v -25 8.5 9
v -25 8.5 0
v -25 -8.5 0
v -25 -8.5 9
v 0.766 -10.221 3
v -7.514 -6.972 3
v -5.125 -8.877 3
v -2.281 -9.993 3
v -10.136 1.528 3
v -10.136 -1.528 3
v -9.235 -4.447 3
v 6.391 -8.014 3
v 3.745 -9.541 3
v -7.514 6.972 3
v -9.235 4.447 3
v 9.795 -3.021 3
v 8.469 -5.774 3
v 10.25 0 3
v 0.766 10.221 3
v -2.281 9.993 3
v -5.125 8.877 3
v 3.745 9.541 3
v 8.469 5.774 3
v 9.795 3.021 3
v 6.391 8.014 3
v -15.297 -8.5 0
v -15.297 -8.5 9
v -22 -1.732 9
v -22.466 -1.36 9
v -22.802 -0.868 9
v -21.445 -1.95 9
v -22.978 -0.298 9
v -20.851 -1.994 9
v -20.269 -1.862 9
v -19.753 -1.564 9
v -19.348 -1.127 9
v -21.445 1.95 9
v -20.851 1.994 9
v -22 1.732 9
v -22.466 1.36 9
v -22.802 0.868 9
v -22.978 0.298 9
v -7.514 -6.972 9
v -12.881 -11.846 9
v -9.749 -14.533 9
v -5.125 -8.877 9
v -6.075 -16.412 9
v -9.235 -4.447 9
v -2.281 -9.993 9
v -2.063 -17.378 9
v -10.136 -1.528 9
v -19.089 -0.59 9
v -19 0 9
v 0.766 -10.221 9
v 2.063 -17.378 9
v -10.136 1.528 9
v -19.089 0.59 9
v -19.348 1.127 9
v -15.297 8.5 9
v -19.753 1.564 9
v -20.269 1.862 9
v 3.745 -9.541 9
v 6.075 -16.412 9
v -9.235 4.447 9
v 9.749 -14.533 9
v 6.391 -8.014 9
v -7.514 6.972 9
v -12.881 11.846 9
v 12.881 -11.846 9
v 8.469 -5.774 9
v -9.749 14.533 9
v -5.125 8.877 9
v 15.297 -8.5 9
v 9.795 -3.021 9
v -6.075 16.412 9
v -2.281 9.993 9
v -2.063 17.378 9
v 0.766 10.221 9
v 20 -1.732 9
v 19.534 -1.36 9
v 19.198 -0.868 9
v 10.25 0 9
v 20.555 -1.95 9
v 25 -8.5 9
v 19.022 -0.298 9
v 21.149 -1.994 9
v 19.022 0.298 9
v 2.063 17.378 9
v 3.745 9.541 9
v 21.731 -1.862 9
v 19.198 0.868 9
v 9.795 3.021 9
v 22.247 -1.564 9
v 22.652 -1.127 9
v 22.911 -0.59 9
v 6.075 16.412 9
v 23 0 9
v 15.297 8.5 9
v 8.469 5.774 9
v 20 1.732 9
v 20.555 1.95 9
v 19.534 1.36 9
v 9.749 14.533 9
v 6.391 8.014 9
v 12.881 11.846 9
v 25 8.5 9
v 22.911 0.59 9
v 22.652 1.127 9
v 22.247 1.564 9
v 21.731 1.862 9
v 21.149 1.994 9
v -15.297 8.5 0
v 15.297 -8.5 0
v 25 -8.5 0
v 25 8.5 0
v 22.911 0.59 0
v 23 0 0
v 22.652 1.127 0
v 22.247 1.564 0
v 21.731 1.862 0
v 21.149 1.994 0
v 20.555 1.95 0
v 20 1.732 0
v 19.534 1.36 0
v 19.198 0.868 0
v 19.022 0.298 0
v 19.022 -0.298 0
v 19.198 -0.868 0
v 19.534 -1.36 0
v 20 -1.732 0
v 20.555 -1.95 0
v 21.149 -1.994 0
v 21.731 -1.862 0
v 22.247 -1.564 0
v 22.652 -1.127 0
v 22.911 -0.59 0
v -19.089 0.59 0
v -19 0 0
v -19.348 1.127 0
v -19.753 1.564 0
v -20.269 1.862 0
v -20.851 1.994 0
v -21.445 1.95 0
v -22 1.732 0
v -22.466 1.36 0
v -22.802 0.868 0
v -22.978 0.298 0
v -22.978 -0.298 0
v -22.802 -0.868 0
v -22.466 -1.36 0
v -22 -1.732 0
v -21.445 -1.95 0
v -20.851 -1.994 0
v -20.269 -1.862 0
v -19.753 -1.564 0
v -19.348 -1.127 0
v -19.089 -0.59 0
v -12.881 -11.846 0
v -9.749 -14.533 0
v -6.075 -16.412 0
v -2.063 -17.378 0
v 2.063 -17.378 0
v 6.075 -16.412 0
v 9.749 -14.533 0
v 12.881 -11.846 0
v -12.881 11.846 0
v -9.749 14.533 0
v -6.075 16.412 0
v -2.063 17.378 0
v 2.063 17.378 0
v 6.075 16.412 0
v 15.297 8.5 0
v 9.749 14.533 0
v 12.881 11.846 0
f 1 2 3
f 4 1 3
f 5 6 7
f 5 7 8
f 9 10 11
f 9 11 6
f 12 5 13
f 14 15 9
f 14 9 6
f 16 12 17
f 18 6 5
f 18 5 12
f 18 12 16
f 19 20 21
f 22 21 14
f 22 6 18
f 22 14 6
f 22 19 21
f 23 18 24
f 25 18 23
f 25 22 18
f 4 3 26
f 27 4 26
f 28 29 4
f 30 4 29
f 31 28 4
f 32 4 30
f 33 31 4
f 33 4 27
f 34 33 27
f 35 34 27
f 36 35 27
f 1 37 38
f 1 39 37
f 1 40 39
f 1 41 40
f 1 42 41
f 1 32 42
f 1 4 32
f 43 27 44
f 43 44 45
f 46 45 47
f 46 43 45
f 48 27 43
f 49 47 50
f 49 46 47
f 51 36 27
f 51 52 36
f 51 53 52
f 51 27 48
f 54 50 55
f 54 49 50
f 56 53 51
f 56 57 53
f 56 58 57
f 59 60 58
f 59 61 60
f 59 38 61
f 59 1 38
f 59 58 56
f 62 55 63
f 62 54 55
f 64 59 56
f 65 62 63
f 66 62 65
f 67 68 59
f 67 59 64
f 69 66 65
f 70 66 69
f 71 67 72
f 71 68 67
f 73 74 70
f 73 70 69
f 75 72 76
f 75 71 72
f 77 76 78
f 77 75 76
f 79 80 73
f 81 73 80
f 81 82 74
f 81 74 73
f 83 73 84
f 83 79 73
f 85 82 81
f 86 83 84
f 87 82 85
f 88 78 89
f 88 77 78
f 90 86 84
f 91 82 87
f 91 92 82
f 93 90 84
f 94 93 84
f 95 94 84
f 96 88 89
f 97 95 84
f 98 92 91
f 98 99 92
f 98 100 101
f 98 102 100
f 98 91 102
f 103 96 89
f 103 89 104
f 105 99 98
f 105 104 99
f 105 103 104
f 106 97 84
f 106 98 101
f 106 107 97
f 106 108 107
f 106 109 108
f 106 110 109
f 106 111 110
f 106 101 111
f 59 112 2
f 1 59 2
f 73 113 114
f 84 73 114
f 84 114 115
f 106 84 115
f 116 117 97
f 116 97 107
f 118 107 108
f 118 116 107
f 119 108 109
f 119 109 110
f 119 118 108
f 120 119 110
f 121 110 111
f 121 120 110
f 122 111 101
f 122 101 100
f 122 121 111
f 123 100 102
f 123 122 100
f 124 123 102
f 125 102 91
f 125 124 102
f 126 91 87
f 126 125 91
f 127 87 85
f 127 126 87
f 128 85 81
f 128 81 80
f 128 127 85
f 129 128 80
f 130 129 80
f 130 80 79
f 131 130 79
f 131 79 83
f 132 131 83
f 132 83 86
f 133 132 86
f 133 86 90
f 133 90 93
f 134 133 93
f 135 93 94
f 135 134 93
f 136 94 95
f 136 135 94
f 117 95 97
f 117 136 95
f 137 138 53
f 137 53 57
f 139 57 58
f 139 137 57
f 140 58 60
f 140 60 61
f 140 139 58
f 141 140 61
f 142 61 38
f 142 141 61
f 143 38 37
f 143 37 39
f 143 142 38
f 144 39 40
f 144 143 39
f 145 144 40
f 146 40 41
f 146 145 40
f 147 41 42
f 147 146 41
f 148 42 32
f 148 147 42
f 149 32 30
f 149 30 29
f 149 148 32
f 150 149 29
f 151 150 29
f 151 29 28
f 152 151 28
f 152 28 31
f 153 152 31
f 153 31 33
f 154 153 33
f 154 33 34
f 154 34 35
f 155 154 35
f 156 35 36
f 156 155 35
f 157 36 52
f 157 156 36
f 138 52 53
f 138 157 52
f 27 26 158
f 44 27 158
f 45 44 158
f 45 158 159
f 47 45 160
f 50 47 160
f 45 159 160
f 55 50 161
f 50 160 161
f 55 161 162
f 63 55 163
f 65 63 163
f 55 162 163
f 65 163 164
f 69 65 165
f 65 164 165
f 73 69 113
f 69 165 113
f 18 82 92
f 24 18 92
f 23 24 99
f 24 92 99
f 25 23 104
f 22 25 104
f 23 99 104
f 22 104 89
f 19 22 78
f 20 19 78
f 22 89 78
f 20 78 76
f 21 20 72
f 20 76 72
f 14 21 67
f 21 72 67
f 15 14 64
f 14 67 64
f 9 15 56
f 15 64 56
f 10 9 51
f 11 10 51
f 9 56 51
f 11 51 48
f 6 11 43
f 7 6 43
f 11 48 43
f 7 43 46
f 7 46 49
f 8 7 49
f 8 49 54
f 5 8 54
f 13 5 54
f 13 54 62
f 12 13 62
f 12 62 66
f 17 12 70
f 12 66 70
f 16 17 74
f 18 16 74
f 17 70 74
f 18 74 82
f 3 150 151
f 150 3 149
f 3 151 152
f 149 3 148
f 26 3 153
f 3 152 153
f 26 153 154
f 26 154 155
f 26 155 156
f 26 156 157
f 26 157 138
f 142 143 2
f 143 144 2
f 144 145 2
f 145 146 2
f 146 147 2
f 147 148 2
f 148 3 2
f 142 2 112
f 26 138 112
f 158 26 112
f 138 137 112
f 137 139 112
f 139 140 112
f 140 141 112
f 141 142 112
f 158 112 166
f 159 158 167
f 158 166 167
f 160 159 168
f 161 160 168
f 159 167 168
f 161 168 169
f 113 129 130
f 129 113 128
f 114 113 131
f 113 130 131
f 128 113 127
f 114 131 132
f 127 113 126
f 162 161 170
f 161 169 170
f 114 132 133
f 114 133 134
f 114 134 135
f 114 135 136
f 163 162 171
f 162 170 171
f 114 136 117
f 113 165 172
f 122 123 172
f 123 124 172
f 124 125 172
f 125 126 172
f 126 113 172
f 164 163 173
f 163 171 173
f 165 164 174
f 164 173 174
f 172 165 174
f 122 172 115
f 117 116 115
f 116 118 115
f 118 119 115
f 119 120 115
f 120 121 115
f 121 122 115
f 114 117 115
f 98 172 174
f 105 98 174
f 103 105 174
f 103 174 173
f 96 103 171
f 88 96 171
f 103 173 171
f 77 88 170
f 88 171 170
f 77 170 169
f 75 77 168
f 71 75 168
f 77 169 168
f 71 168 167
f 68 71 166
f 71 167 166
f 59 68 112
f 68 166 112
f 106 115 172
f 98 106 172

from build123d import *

# Parameters (mm, degrees)
SKETCH1_R           = 2
BOSS_EXTRUDE3_DEPTH = 9
SKETCH2_R           = 10.25
CUT_EXTRUDE1_DEPTH  = 6


with BuildPart() as part:
    # Sketch1 → Boss-Extrude3 (new body)
    # profile 1 of 5: a face of its own
    with BuildSketch(Plane.XY):
        with BuildLine():
            Line((-25, 8.5), (-25, -8.5))
            Line((-25, -8.5), (-15.297058541, -8.5))
            ThreePointArc((-15.297058541, -8.5), (-17.5, 0), (-15.297058541, 8.5))
            Line((-15.297058541, 8.5), (-25, 8.5))
        make_face()
        with Locations((-21, 0)):
            Circle(SKETCH1_R, mode=Mode.SUBTRACT)
    # profile 2 of 5: a face of its own
    with BuildSketch(Plane.XY):
        with BuildLine():
            ThreePointArc((15.297058541, 8.5), (0, 17.5), (-15.297058541, 8.5))
            Line((-15.297058541, 8.5), (15.297058541, 8.5))
        make_face()
    # profile 3 of 5: a face of its own
    with BuildSketch(Plane.XY):
        with BuildLine():
            ThreePointArc((-15.297058541, 8.5), (-17.5, 0), (-15.297058541, -8.5))
            Line((-15.297058541, -8.5), (15.297058541, -8.5))
            ThreePointArc((15.297058541, -8.5), (16.940314703, -4.390414305), (17.5, 0))
            ThreePointArc((17.5, 0), (16.940314703, 4.390414305), (15.297058541, 8.5))
            Line((15.297058541, 8.5), (-15.297058541, 8.5))
        make_face()
    # profile 4 of 5: a face of its own
    with BuildSketch(Plane.XY):
        with BuildLine():
            Line((15.297058541, -8.5), (-15.297058541, -8.5))
            ThreePointArc((-15.297058541, -8.5), (0, -17.5), (15.297058541, -8.5))
        make_face()
    # profile 5 of 5: a face of its own
    with BuildSketch(Plane.XY):
        with BuildLine():
            ThreePointArc((17.5, 0), (16.940314703, -4.390414305), (15.297058541, -8.5))
            Line((15.297058541, -8.5), (25, -8.5))
            Line((25, -8.5), (25, 8.5))
            Line((25, 8.5), (15.297058541, 8.5))
            ThreePointArc((15.297058541, 8.5), (16.940314703, 4.390414305), (17.5, 0))
        make_face()
        with Locations((21, 0)):
            Circle(SKETCH1_R, mode=Mode.SUBTRACT)
    extrude(amount=BOSS_EXTRUDE3_DEPTH)

    # Sketch2 → Cut-Extrude1 (cut)
    with BuildSketch(Plane.XY.offset(9)):
        Circle(SKETCH2_R)
    extrude(amount=-CUT_EXTRUDE1_DEPTH, mode=Mode.SUBTRACT)


solid = part.part
